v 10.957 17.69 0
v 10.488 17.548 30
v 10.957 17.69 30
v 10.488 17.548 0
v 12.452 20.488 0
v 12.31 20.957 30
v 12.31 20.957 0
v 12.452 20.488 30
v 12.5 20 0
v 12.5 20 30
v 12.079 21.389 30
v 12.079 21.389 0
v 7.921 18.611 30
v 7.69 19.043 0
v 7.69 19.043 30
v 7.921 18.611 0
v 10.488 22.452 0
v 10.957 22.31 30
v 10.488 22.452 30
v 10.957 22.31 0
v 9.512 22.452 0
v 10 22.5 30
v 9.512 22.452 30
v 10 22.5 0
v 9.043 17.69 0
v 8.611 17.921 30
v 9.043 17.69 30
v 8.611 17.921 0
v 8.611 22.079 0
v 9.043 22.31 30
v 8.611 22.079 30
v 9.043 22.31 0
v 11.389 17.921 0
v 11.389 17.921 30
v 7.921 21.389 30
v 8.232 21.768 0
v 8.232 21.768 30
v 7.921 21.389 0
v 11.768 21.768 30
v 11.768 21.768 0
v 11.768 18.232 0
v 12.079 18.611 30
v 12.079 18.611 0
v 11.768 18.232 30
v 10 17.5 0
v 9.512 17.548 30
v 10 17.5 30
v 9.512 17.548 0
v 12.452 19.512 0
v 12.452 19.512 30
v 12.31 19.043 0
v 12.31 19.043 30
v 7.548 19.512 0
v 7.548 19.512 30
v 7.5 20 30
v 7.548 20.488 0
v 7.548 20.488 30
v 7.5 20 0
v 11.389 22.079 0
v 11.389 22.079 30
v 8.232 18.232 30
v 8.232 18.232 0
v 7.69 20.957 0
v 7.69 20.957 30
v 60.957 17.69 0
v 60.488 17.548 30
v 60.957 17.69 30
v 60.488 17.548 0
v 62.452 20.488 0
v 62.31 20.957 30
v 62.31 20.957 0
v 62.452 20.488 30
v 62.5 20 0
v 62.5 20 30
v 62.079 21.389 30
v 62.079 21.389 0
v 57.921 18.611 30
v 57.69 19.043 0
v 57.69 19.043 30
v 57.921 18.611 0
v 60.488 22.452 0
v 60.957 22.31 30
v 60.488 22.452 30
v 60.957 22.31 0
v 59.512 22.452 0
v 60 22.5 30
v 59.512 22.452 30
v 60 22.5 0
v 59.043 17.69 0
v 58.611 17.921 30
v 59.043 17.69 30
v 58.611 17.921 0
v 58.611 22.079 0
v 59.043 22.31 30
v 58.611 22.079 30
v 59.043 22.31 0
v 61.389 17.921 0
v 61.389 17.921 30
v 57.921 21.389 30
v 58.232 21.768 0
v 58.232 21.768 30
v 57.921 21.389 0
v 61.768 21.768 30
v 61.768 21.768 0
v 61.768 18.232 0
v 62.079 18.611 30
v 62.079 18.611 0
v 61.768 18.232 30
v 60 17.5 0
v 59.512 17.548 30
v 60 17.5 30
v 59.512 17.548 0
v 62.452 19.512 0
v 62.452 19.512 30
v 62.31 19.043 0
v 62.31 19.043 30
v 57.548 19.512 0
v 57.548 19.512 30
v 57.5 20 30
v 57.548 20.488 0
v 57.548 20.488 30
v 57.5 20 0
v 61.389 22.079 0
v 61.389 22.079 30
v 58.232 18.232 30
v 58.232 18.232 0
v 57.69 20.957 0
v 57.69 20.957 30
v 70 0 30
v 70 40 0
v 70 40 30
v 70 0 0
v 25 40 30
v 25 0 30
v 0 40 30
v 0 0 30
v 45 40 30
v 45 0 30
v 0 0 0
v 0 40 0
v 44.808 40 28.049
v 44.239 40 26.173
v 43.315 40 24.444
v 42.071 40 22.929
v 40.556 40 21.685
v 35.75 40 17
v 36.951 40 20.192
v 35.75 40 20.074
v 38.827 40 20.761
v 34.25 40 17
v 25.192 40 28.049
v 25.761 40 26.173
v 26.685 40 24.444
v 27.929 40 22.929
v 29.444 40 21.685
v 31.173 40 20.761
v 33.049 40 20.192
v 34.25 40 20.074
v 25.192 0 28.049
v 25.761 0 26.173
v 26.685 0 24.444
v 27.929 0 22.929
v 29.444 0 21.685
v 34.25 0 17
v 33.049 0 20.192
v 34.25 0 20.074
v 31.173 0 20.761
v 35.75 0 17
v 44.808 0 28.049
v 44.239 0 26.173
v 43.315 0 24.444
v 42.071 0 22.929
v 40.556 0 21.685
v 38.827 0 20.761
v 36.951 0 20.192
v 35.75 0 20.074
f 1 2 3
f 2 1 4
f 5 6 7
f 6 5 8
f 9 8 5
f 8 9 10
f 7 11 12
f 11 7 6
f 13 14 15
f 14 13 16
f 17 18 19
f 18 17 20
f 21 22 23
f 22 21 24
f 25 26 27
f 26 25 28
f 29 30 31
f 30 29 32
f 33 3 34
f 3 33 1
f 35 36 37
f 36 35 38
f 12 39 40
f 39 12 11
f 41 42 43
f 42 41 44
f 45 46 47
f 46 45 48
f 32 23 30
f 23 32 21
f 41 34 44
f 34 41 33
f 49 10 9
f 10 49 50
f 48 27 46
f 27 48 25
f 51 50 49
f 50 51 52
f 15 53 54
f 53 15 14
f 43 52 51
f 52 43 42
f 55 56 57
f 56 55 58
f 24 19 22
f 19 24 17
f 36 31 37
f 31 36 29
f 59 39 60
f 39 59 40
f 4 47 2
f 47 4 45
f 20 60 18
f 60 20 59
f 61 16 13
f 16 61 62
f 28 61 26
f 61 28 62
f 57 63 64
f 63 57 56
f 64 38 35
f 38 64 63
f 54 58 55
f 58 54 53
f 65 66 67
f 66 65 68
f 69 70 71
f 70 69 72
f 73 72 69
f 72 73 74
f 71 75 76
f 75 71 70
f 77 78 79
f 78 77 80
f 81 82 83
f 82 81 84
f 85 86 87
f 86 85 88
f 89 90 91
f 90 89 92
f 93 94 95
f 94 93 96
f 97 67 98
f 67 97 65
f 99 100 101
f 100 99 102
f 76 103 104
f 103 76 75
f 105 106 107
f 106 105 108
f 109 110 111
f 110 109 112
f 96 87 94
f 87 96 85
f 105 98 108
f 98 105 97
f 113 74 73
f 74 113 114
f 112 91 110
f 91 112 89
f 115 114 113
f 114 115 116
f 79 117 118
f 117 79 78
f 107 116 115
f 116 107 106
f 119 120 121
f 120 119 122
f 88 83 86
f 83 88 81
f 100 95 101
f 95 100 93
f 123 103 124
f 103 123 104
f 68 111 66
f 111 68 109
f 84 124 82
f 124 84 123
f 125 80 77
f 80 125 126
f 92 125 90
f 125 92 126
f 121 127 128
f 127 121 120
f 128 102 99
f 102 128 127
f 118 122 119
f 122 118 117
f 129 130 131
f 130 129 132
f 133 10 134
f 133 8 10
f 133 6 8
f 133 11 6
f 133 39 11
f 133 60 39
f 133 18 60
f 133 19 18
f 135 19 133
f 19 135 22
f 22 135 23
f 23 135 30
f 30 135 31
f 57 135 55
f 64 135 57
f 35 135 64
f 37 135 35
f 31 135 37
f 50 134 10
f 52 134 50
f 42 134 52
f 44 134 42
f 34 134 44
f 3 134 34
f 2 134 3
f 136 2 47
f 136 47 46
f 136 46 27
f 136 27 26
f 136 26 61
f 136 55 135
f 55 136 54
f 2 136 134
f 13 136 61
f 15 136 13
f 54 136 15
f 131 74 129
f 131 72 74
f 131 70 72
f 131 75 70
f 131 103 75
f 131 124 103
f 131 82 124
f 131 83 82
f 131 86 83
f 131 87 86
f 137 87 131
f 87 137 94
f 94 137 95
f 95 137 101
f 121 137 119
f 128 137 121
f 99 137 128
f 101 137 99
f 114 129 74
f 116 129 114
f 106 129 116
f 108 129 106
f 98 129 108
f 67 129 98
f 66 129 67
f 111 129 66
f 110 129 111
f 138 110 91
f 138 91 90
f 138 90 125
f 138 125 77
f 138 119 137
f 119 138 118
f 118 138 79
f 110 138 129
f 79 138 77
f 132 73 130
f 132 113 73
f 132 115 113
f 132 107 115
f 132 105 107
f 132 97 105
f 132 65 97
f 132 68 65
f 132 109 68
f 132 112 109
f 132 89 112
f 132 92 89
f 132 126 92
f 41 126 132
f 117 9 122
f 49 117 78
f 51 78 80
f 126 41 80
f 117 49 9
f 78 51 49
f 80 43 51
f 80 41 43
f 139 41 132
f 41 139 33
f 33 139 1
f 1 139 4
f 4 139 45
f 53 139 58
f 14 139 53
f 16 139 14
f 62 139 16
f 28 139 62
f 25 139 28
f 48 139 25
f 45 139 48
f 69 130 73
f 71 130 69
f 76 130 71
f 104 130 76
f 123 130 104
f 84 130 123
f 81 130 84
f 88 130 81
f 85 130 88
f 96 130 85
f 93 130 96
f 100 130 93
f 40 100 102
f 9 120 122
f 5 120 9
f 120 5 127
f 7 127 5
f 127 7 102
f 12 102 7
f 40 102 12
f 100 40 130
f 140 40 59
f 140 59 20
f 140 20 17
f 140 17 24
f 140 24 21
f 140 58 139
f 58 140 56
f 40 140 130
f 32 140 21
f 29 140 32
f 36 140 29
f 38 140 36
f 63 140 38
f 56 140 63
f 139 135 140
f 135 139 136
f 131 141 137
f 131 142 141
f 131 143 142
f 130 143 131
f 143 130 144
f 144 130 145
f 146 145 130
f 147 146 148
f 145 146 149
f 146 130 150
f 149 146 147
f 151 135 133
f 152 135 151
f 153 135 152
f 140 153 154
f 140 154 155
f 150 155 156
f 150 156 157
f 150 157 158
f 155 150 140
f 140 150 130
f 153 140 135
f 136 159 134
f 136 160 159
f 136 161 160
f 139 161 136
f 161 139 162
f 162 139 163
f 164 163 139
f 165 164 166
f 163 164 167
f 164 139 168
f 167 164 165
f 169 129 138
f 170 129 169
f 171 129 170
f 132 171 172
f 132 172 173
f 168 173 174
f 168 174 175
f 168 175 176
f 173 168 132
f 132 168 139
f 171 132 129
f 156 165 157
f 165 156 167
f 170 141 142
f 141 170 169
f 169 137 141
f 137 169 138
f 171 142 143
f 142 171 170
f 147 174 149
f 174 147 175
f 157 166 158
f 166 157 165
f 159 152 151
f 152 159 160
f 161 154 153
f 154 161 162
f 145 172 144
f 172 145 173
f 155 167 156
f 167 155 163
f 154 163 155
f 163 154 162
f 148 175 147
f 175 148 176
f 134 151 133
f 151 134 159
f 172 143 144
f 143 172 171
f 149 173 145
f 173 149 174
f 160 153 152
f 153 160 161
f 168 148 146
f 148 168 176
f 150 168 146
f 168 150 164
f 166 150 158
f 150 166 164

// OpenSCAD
$fn = 32;

// ----------------------------------------------------------------------
// Saddle clamp: split shaft clamp
// ----------------------------------------------------------------------

// --- parameters (mm) ---
blk_l = 70;               // block length, X
blk_w = 40;               // block width, Y
blk_h = 30;               // block height
clamp_r = 10;             // shaft groove radius
hole_r = 2.5;             // bolt hole radius
hole_m = 10;              // bolt hole margin from the ends
saw_w = 1.5;              // saw kerf width
fit_tol = 0.05;           // tolerance for press fits, mm
free_tol = 0.3;           // tolerance for clearance fits, mm

saw_depth = clamp_r + 3;  // saw kerf depth

difference() {
  cube([blk_l, blk_w, blk_h]);
  translate([blk_l / 2, -1, blk_h])
    rotate([-90, 0, 0])
      cylinder(h = blk_w + 2, r = clamp_r);
  for (sx = [0, 1])
    translate([sx ? blk_l - hole_m : hole_m, blk_w / 2, -1])
      cylinder(r = hole_r, h = blk_h + 2);
  translate([blk_l / 2 - saw_w / 2, -1, blk_h - saw_depth])
    cube([saw_w, blk_w + 2, saw_depth + 1]);
}
